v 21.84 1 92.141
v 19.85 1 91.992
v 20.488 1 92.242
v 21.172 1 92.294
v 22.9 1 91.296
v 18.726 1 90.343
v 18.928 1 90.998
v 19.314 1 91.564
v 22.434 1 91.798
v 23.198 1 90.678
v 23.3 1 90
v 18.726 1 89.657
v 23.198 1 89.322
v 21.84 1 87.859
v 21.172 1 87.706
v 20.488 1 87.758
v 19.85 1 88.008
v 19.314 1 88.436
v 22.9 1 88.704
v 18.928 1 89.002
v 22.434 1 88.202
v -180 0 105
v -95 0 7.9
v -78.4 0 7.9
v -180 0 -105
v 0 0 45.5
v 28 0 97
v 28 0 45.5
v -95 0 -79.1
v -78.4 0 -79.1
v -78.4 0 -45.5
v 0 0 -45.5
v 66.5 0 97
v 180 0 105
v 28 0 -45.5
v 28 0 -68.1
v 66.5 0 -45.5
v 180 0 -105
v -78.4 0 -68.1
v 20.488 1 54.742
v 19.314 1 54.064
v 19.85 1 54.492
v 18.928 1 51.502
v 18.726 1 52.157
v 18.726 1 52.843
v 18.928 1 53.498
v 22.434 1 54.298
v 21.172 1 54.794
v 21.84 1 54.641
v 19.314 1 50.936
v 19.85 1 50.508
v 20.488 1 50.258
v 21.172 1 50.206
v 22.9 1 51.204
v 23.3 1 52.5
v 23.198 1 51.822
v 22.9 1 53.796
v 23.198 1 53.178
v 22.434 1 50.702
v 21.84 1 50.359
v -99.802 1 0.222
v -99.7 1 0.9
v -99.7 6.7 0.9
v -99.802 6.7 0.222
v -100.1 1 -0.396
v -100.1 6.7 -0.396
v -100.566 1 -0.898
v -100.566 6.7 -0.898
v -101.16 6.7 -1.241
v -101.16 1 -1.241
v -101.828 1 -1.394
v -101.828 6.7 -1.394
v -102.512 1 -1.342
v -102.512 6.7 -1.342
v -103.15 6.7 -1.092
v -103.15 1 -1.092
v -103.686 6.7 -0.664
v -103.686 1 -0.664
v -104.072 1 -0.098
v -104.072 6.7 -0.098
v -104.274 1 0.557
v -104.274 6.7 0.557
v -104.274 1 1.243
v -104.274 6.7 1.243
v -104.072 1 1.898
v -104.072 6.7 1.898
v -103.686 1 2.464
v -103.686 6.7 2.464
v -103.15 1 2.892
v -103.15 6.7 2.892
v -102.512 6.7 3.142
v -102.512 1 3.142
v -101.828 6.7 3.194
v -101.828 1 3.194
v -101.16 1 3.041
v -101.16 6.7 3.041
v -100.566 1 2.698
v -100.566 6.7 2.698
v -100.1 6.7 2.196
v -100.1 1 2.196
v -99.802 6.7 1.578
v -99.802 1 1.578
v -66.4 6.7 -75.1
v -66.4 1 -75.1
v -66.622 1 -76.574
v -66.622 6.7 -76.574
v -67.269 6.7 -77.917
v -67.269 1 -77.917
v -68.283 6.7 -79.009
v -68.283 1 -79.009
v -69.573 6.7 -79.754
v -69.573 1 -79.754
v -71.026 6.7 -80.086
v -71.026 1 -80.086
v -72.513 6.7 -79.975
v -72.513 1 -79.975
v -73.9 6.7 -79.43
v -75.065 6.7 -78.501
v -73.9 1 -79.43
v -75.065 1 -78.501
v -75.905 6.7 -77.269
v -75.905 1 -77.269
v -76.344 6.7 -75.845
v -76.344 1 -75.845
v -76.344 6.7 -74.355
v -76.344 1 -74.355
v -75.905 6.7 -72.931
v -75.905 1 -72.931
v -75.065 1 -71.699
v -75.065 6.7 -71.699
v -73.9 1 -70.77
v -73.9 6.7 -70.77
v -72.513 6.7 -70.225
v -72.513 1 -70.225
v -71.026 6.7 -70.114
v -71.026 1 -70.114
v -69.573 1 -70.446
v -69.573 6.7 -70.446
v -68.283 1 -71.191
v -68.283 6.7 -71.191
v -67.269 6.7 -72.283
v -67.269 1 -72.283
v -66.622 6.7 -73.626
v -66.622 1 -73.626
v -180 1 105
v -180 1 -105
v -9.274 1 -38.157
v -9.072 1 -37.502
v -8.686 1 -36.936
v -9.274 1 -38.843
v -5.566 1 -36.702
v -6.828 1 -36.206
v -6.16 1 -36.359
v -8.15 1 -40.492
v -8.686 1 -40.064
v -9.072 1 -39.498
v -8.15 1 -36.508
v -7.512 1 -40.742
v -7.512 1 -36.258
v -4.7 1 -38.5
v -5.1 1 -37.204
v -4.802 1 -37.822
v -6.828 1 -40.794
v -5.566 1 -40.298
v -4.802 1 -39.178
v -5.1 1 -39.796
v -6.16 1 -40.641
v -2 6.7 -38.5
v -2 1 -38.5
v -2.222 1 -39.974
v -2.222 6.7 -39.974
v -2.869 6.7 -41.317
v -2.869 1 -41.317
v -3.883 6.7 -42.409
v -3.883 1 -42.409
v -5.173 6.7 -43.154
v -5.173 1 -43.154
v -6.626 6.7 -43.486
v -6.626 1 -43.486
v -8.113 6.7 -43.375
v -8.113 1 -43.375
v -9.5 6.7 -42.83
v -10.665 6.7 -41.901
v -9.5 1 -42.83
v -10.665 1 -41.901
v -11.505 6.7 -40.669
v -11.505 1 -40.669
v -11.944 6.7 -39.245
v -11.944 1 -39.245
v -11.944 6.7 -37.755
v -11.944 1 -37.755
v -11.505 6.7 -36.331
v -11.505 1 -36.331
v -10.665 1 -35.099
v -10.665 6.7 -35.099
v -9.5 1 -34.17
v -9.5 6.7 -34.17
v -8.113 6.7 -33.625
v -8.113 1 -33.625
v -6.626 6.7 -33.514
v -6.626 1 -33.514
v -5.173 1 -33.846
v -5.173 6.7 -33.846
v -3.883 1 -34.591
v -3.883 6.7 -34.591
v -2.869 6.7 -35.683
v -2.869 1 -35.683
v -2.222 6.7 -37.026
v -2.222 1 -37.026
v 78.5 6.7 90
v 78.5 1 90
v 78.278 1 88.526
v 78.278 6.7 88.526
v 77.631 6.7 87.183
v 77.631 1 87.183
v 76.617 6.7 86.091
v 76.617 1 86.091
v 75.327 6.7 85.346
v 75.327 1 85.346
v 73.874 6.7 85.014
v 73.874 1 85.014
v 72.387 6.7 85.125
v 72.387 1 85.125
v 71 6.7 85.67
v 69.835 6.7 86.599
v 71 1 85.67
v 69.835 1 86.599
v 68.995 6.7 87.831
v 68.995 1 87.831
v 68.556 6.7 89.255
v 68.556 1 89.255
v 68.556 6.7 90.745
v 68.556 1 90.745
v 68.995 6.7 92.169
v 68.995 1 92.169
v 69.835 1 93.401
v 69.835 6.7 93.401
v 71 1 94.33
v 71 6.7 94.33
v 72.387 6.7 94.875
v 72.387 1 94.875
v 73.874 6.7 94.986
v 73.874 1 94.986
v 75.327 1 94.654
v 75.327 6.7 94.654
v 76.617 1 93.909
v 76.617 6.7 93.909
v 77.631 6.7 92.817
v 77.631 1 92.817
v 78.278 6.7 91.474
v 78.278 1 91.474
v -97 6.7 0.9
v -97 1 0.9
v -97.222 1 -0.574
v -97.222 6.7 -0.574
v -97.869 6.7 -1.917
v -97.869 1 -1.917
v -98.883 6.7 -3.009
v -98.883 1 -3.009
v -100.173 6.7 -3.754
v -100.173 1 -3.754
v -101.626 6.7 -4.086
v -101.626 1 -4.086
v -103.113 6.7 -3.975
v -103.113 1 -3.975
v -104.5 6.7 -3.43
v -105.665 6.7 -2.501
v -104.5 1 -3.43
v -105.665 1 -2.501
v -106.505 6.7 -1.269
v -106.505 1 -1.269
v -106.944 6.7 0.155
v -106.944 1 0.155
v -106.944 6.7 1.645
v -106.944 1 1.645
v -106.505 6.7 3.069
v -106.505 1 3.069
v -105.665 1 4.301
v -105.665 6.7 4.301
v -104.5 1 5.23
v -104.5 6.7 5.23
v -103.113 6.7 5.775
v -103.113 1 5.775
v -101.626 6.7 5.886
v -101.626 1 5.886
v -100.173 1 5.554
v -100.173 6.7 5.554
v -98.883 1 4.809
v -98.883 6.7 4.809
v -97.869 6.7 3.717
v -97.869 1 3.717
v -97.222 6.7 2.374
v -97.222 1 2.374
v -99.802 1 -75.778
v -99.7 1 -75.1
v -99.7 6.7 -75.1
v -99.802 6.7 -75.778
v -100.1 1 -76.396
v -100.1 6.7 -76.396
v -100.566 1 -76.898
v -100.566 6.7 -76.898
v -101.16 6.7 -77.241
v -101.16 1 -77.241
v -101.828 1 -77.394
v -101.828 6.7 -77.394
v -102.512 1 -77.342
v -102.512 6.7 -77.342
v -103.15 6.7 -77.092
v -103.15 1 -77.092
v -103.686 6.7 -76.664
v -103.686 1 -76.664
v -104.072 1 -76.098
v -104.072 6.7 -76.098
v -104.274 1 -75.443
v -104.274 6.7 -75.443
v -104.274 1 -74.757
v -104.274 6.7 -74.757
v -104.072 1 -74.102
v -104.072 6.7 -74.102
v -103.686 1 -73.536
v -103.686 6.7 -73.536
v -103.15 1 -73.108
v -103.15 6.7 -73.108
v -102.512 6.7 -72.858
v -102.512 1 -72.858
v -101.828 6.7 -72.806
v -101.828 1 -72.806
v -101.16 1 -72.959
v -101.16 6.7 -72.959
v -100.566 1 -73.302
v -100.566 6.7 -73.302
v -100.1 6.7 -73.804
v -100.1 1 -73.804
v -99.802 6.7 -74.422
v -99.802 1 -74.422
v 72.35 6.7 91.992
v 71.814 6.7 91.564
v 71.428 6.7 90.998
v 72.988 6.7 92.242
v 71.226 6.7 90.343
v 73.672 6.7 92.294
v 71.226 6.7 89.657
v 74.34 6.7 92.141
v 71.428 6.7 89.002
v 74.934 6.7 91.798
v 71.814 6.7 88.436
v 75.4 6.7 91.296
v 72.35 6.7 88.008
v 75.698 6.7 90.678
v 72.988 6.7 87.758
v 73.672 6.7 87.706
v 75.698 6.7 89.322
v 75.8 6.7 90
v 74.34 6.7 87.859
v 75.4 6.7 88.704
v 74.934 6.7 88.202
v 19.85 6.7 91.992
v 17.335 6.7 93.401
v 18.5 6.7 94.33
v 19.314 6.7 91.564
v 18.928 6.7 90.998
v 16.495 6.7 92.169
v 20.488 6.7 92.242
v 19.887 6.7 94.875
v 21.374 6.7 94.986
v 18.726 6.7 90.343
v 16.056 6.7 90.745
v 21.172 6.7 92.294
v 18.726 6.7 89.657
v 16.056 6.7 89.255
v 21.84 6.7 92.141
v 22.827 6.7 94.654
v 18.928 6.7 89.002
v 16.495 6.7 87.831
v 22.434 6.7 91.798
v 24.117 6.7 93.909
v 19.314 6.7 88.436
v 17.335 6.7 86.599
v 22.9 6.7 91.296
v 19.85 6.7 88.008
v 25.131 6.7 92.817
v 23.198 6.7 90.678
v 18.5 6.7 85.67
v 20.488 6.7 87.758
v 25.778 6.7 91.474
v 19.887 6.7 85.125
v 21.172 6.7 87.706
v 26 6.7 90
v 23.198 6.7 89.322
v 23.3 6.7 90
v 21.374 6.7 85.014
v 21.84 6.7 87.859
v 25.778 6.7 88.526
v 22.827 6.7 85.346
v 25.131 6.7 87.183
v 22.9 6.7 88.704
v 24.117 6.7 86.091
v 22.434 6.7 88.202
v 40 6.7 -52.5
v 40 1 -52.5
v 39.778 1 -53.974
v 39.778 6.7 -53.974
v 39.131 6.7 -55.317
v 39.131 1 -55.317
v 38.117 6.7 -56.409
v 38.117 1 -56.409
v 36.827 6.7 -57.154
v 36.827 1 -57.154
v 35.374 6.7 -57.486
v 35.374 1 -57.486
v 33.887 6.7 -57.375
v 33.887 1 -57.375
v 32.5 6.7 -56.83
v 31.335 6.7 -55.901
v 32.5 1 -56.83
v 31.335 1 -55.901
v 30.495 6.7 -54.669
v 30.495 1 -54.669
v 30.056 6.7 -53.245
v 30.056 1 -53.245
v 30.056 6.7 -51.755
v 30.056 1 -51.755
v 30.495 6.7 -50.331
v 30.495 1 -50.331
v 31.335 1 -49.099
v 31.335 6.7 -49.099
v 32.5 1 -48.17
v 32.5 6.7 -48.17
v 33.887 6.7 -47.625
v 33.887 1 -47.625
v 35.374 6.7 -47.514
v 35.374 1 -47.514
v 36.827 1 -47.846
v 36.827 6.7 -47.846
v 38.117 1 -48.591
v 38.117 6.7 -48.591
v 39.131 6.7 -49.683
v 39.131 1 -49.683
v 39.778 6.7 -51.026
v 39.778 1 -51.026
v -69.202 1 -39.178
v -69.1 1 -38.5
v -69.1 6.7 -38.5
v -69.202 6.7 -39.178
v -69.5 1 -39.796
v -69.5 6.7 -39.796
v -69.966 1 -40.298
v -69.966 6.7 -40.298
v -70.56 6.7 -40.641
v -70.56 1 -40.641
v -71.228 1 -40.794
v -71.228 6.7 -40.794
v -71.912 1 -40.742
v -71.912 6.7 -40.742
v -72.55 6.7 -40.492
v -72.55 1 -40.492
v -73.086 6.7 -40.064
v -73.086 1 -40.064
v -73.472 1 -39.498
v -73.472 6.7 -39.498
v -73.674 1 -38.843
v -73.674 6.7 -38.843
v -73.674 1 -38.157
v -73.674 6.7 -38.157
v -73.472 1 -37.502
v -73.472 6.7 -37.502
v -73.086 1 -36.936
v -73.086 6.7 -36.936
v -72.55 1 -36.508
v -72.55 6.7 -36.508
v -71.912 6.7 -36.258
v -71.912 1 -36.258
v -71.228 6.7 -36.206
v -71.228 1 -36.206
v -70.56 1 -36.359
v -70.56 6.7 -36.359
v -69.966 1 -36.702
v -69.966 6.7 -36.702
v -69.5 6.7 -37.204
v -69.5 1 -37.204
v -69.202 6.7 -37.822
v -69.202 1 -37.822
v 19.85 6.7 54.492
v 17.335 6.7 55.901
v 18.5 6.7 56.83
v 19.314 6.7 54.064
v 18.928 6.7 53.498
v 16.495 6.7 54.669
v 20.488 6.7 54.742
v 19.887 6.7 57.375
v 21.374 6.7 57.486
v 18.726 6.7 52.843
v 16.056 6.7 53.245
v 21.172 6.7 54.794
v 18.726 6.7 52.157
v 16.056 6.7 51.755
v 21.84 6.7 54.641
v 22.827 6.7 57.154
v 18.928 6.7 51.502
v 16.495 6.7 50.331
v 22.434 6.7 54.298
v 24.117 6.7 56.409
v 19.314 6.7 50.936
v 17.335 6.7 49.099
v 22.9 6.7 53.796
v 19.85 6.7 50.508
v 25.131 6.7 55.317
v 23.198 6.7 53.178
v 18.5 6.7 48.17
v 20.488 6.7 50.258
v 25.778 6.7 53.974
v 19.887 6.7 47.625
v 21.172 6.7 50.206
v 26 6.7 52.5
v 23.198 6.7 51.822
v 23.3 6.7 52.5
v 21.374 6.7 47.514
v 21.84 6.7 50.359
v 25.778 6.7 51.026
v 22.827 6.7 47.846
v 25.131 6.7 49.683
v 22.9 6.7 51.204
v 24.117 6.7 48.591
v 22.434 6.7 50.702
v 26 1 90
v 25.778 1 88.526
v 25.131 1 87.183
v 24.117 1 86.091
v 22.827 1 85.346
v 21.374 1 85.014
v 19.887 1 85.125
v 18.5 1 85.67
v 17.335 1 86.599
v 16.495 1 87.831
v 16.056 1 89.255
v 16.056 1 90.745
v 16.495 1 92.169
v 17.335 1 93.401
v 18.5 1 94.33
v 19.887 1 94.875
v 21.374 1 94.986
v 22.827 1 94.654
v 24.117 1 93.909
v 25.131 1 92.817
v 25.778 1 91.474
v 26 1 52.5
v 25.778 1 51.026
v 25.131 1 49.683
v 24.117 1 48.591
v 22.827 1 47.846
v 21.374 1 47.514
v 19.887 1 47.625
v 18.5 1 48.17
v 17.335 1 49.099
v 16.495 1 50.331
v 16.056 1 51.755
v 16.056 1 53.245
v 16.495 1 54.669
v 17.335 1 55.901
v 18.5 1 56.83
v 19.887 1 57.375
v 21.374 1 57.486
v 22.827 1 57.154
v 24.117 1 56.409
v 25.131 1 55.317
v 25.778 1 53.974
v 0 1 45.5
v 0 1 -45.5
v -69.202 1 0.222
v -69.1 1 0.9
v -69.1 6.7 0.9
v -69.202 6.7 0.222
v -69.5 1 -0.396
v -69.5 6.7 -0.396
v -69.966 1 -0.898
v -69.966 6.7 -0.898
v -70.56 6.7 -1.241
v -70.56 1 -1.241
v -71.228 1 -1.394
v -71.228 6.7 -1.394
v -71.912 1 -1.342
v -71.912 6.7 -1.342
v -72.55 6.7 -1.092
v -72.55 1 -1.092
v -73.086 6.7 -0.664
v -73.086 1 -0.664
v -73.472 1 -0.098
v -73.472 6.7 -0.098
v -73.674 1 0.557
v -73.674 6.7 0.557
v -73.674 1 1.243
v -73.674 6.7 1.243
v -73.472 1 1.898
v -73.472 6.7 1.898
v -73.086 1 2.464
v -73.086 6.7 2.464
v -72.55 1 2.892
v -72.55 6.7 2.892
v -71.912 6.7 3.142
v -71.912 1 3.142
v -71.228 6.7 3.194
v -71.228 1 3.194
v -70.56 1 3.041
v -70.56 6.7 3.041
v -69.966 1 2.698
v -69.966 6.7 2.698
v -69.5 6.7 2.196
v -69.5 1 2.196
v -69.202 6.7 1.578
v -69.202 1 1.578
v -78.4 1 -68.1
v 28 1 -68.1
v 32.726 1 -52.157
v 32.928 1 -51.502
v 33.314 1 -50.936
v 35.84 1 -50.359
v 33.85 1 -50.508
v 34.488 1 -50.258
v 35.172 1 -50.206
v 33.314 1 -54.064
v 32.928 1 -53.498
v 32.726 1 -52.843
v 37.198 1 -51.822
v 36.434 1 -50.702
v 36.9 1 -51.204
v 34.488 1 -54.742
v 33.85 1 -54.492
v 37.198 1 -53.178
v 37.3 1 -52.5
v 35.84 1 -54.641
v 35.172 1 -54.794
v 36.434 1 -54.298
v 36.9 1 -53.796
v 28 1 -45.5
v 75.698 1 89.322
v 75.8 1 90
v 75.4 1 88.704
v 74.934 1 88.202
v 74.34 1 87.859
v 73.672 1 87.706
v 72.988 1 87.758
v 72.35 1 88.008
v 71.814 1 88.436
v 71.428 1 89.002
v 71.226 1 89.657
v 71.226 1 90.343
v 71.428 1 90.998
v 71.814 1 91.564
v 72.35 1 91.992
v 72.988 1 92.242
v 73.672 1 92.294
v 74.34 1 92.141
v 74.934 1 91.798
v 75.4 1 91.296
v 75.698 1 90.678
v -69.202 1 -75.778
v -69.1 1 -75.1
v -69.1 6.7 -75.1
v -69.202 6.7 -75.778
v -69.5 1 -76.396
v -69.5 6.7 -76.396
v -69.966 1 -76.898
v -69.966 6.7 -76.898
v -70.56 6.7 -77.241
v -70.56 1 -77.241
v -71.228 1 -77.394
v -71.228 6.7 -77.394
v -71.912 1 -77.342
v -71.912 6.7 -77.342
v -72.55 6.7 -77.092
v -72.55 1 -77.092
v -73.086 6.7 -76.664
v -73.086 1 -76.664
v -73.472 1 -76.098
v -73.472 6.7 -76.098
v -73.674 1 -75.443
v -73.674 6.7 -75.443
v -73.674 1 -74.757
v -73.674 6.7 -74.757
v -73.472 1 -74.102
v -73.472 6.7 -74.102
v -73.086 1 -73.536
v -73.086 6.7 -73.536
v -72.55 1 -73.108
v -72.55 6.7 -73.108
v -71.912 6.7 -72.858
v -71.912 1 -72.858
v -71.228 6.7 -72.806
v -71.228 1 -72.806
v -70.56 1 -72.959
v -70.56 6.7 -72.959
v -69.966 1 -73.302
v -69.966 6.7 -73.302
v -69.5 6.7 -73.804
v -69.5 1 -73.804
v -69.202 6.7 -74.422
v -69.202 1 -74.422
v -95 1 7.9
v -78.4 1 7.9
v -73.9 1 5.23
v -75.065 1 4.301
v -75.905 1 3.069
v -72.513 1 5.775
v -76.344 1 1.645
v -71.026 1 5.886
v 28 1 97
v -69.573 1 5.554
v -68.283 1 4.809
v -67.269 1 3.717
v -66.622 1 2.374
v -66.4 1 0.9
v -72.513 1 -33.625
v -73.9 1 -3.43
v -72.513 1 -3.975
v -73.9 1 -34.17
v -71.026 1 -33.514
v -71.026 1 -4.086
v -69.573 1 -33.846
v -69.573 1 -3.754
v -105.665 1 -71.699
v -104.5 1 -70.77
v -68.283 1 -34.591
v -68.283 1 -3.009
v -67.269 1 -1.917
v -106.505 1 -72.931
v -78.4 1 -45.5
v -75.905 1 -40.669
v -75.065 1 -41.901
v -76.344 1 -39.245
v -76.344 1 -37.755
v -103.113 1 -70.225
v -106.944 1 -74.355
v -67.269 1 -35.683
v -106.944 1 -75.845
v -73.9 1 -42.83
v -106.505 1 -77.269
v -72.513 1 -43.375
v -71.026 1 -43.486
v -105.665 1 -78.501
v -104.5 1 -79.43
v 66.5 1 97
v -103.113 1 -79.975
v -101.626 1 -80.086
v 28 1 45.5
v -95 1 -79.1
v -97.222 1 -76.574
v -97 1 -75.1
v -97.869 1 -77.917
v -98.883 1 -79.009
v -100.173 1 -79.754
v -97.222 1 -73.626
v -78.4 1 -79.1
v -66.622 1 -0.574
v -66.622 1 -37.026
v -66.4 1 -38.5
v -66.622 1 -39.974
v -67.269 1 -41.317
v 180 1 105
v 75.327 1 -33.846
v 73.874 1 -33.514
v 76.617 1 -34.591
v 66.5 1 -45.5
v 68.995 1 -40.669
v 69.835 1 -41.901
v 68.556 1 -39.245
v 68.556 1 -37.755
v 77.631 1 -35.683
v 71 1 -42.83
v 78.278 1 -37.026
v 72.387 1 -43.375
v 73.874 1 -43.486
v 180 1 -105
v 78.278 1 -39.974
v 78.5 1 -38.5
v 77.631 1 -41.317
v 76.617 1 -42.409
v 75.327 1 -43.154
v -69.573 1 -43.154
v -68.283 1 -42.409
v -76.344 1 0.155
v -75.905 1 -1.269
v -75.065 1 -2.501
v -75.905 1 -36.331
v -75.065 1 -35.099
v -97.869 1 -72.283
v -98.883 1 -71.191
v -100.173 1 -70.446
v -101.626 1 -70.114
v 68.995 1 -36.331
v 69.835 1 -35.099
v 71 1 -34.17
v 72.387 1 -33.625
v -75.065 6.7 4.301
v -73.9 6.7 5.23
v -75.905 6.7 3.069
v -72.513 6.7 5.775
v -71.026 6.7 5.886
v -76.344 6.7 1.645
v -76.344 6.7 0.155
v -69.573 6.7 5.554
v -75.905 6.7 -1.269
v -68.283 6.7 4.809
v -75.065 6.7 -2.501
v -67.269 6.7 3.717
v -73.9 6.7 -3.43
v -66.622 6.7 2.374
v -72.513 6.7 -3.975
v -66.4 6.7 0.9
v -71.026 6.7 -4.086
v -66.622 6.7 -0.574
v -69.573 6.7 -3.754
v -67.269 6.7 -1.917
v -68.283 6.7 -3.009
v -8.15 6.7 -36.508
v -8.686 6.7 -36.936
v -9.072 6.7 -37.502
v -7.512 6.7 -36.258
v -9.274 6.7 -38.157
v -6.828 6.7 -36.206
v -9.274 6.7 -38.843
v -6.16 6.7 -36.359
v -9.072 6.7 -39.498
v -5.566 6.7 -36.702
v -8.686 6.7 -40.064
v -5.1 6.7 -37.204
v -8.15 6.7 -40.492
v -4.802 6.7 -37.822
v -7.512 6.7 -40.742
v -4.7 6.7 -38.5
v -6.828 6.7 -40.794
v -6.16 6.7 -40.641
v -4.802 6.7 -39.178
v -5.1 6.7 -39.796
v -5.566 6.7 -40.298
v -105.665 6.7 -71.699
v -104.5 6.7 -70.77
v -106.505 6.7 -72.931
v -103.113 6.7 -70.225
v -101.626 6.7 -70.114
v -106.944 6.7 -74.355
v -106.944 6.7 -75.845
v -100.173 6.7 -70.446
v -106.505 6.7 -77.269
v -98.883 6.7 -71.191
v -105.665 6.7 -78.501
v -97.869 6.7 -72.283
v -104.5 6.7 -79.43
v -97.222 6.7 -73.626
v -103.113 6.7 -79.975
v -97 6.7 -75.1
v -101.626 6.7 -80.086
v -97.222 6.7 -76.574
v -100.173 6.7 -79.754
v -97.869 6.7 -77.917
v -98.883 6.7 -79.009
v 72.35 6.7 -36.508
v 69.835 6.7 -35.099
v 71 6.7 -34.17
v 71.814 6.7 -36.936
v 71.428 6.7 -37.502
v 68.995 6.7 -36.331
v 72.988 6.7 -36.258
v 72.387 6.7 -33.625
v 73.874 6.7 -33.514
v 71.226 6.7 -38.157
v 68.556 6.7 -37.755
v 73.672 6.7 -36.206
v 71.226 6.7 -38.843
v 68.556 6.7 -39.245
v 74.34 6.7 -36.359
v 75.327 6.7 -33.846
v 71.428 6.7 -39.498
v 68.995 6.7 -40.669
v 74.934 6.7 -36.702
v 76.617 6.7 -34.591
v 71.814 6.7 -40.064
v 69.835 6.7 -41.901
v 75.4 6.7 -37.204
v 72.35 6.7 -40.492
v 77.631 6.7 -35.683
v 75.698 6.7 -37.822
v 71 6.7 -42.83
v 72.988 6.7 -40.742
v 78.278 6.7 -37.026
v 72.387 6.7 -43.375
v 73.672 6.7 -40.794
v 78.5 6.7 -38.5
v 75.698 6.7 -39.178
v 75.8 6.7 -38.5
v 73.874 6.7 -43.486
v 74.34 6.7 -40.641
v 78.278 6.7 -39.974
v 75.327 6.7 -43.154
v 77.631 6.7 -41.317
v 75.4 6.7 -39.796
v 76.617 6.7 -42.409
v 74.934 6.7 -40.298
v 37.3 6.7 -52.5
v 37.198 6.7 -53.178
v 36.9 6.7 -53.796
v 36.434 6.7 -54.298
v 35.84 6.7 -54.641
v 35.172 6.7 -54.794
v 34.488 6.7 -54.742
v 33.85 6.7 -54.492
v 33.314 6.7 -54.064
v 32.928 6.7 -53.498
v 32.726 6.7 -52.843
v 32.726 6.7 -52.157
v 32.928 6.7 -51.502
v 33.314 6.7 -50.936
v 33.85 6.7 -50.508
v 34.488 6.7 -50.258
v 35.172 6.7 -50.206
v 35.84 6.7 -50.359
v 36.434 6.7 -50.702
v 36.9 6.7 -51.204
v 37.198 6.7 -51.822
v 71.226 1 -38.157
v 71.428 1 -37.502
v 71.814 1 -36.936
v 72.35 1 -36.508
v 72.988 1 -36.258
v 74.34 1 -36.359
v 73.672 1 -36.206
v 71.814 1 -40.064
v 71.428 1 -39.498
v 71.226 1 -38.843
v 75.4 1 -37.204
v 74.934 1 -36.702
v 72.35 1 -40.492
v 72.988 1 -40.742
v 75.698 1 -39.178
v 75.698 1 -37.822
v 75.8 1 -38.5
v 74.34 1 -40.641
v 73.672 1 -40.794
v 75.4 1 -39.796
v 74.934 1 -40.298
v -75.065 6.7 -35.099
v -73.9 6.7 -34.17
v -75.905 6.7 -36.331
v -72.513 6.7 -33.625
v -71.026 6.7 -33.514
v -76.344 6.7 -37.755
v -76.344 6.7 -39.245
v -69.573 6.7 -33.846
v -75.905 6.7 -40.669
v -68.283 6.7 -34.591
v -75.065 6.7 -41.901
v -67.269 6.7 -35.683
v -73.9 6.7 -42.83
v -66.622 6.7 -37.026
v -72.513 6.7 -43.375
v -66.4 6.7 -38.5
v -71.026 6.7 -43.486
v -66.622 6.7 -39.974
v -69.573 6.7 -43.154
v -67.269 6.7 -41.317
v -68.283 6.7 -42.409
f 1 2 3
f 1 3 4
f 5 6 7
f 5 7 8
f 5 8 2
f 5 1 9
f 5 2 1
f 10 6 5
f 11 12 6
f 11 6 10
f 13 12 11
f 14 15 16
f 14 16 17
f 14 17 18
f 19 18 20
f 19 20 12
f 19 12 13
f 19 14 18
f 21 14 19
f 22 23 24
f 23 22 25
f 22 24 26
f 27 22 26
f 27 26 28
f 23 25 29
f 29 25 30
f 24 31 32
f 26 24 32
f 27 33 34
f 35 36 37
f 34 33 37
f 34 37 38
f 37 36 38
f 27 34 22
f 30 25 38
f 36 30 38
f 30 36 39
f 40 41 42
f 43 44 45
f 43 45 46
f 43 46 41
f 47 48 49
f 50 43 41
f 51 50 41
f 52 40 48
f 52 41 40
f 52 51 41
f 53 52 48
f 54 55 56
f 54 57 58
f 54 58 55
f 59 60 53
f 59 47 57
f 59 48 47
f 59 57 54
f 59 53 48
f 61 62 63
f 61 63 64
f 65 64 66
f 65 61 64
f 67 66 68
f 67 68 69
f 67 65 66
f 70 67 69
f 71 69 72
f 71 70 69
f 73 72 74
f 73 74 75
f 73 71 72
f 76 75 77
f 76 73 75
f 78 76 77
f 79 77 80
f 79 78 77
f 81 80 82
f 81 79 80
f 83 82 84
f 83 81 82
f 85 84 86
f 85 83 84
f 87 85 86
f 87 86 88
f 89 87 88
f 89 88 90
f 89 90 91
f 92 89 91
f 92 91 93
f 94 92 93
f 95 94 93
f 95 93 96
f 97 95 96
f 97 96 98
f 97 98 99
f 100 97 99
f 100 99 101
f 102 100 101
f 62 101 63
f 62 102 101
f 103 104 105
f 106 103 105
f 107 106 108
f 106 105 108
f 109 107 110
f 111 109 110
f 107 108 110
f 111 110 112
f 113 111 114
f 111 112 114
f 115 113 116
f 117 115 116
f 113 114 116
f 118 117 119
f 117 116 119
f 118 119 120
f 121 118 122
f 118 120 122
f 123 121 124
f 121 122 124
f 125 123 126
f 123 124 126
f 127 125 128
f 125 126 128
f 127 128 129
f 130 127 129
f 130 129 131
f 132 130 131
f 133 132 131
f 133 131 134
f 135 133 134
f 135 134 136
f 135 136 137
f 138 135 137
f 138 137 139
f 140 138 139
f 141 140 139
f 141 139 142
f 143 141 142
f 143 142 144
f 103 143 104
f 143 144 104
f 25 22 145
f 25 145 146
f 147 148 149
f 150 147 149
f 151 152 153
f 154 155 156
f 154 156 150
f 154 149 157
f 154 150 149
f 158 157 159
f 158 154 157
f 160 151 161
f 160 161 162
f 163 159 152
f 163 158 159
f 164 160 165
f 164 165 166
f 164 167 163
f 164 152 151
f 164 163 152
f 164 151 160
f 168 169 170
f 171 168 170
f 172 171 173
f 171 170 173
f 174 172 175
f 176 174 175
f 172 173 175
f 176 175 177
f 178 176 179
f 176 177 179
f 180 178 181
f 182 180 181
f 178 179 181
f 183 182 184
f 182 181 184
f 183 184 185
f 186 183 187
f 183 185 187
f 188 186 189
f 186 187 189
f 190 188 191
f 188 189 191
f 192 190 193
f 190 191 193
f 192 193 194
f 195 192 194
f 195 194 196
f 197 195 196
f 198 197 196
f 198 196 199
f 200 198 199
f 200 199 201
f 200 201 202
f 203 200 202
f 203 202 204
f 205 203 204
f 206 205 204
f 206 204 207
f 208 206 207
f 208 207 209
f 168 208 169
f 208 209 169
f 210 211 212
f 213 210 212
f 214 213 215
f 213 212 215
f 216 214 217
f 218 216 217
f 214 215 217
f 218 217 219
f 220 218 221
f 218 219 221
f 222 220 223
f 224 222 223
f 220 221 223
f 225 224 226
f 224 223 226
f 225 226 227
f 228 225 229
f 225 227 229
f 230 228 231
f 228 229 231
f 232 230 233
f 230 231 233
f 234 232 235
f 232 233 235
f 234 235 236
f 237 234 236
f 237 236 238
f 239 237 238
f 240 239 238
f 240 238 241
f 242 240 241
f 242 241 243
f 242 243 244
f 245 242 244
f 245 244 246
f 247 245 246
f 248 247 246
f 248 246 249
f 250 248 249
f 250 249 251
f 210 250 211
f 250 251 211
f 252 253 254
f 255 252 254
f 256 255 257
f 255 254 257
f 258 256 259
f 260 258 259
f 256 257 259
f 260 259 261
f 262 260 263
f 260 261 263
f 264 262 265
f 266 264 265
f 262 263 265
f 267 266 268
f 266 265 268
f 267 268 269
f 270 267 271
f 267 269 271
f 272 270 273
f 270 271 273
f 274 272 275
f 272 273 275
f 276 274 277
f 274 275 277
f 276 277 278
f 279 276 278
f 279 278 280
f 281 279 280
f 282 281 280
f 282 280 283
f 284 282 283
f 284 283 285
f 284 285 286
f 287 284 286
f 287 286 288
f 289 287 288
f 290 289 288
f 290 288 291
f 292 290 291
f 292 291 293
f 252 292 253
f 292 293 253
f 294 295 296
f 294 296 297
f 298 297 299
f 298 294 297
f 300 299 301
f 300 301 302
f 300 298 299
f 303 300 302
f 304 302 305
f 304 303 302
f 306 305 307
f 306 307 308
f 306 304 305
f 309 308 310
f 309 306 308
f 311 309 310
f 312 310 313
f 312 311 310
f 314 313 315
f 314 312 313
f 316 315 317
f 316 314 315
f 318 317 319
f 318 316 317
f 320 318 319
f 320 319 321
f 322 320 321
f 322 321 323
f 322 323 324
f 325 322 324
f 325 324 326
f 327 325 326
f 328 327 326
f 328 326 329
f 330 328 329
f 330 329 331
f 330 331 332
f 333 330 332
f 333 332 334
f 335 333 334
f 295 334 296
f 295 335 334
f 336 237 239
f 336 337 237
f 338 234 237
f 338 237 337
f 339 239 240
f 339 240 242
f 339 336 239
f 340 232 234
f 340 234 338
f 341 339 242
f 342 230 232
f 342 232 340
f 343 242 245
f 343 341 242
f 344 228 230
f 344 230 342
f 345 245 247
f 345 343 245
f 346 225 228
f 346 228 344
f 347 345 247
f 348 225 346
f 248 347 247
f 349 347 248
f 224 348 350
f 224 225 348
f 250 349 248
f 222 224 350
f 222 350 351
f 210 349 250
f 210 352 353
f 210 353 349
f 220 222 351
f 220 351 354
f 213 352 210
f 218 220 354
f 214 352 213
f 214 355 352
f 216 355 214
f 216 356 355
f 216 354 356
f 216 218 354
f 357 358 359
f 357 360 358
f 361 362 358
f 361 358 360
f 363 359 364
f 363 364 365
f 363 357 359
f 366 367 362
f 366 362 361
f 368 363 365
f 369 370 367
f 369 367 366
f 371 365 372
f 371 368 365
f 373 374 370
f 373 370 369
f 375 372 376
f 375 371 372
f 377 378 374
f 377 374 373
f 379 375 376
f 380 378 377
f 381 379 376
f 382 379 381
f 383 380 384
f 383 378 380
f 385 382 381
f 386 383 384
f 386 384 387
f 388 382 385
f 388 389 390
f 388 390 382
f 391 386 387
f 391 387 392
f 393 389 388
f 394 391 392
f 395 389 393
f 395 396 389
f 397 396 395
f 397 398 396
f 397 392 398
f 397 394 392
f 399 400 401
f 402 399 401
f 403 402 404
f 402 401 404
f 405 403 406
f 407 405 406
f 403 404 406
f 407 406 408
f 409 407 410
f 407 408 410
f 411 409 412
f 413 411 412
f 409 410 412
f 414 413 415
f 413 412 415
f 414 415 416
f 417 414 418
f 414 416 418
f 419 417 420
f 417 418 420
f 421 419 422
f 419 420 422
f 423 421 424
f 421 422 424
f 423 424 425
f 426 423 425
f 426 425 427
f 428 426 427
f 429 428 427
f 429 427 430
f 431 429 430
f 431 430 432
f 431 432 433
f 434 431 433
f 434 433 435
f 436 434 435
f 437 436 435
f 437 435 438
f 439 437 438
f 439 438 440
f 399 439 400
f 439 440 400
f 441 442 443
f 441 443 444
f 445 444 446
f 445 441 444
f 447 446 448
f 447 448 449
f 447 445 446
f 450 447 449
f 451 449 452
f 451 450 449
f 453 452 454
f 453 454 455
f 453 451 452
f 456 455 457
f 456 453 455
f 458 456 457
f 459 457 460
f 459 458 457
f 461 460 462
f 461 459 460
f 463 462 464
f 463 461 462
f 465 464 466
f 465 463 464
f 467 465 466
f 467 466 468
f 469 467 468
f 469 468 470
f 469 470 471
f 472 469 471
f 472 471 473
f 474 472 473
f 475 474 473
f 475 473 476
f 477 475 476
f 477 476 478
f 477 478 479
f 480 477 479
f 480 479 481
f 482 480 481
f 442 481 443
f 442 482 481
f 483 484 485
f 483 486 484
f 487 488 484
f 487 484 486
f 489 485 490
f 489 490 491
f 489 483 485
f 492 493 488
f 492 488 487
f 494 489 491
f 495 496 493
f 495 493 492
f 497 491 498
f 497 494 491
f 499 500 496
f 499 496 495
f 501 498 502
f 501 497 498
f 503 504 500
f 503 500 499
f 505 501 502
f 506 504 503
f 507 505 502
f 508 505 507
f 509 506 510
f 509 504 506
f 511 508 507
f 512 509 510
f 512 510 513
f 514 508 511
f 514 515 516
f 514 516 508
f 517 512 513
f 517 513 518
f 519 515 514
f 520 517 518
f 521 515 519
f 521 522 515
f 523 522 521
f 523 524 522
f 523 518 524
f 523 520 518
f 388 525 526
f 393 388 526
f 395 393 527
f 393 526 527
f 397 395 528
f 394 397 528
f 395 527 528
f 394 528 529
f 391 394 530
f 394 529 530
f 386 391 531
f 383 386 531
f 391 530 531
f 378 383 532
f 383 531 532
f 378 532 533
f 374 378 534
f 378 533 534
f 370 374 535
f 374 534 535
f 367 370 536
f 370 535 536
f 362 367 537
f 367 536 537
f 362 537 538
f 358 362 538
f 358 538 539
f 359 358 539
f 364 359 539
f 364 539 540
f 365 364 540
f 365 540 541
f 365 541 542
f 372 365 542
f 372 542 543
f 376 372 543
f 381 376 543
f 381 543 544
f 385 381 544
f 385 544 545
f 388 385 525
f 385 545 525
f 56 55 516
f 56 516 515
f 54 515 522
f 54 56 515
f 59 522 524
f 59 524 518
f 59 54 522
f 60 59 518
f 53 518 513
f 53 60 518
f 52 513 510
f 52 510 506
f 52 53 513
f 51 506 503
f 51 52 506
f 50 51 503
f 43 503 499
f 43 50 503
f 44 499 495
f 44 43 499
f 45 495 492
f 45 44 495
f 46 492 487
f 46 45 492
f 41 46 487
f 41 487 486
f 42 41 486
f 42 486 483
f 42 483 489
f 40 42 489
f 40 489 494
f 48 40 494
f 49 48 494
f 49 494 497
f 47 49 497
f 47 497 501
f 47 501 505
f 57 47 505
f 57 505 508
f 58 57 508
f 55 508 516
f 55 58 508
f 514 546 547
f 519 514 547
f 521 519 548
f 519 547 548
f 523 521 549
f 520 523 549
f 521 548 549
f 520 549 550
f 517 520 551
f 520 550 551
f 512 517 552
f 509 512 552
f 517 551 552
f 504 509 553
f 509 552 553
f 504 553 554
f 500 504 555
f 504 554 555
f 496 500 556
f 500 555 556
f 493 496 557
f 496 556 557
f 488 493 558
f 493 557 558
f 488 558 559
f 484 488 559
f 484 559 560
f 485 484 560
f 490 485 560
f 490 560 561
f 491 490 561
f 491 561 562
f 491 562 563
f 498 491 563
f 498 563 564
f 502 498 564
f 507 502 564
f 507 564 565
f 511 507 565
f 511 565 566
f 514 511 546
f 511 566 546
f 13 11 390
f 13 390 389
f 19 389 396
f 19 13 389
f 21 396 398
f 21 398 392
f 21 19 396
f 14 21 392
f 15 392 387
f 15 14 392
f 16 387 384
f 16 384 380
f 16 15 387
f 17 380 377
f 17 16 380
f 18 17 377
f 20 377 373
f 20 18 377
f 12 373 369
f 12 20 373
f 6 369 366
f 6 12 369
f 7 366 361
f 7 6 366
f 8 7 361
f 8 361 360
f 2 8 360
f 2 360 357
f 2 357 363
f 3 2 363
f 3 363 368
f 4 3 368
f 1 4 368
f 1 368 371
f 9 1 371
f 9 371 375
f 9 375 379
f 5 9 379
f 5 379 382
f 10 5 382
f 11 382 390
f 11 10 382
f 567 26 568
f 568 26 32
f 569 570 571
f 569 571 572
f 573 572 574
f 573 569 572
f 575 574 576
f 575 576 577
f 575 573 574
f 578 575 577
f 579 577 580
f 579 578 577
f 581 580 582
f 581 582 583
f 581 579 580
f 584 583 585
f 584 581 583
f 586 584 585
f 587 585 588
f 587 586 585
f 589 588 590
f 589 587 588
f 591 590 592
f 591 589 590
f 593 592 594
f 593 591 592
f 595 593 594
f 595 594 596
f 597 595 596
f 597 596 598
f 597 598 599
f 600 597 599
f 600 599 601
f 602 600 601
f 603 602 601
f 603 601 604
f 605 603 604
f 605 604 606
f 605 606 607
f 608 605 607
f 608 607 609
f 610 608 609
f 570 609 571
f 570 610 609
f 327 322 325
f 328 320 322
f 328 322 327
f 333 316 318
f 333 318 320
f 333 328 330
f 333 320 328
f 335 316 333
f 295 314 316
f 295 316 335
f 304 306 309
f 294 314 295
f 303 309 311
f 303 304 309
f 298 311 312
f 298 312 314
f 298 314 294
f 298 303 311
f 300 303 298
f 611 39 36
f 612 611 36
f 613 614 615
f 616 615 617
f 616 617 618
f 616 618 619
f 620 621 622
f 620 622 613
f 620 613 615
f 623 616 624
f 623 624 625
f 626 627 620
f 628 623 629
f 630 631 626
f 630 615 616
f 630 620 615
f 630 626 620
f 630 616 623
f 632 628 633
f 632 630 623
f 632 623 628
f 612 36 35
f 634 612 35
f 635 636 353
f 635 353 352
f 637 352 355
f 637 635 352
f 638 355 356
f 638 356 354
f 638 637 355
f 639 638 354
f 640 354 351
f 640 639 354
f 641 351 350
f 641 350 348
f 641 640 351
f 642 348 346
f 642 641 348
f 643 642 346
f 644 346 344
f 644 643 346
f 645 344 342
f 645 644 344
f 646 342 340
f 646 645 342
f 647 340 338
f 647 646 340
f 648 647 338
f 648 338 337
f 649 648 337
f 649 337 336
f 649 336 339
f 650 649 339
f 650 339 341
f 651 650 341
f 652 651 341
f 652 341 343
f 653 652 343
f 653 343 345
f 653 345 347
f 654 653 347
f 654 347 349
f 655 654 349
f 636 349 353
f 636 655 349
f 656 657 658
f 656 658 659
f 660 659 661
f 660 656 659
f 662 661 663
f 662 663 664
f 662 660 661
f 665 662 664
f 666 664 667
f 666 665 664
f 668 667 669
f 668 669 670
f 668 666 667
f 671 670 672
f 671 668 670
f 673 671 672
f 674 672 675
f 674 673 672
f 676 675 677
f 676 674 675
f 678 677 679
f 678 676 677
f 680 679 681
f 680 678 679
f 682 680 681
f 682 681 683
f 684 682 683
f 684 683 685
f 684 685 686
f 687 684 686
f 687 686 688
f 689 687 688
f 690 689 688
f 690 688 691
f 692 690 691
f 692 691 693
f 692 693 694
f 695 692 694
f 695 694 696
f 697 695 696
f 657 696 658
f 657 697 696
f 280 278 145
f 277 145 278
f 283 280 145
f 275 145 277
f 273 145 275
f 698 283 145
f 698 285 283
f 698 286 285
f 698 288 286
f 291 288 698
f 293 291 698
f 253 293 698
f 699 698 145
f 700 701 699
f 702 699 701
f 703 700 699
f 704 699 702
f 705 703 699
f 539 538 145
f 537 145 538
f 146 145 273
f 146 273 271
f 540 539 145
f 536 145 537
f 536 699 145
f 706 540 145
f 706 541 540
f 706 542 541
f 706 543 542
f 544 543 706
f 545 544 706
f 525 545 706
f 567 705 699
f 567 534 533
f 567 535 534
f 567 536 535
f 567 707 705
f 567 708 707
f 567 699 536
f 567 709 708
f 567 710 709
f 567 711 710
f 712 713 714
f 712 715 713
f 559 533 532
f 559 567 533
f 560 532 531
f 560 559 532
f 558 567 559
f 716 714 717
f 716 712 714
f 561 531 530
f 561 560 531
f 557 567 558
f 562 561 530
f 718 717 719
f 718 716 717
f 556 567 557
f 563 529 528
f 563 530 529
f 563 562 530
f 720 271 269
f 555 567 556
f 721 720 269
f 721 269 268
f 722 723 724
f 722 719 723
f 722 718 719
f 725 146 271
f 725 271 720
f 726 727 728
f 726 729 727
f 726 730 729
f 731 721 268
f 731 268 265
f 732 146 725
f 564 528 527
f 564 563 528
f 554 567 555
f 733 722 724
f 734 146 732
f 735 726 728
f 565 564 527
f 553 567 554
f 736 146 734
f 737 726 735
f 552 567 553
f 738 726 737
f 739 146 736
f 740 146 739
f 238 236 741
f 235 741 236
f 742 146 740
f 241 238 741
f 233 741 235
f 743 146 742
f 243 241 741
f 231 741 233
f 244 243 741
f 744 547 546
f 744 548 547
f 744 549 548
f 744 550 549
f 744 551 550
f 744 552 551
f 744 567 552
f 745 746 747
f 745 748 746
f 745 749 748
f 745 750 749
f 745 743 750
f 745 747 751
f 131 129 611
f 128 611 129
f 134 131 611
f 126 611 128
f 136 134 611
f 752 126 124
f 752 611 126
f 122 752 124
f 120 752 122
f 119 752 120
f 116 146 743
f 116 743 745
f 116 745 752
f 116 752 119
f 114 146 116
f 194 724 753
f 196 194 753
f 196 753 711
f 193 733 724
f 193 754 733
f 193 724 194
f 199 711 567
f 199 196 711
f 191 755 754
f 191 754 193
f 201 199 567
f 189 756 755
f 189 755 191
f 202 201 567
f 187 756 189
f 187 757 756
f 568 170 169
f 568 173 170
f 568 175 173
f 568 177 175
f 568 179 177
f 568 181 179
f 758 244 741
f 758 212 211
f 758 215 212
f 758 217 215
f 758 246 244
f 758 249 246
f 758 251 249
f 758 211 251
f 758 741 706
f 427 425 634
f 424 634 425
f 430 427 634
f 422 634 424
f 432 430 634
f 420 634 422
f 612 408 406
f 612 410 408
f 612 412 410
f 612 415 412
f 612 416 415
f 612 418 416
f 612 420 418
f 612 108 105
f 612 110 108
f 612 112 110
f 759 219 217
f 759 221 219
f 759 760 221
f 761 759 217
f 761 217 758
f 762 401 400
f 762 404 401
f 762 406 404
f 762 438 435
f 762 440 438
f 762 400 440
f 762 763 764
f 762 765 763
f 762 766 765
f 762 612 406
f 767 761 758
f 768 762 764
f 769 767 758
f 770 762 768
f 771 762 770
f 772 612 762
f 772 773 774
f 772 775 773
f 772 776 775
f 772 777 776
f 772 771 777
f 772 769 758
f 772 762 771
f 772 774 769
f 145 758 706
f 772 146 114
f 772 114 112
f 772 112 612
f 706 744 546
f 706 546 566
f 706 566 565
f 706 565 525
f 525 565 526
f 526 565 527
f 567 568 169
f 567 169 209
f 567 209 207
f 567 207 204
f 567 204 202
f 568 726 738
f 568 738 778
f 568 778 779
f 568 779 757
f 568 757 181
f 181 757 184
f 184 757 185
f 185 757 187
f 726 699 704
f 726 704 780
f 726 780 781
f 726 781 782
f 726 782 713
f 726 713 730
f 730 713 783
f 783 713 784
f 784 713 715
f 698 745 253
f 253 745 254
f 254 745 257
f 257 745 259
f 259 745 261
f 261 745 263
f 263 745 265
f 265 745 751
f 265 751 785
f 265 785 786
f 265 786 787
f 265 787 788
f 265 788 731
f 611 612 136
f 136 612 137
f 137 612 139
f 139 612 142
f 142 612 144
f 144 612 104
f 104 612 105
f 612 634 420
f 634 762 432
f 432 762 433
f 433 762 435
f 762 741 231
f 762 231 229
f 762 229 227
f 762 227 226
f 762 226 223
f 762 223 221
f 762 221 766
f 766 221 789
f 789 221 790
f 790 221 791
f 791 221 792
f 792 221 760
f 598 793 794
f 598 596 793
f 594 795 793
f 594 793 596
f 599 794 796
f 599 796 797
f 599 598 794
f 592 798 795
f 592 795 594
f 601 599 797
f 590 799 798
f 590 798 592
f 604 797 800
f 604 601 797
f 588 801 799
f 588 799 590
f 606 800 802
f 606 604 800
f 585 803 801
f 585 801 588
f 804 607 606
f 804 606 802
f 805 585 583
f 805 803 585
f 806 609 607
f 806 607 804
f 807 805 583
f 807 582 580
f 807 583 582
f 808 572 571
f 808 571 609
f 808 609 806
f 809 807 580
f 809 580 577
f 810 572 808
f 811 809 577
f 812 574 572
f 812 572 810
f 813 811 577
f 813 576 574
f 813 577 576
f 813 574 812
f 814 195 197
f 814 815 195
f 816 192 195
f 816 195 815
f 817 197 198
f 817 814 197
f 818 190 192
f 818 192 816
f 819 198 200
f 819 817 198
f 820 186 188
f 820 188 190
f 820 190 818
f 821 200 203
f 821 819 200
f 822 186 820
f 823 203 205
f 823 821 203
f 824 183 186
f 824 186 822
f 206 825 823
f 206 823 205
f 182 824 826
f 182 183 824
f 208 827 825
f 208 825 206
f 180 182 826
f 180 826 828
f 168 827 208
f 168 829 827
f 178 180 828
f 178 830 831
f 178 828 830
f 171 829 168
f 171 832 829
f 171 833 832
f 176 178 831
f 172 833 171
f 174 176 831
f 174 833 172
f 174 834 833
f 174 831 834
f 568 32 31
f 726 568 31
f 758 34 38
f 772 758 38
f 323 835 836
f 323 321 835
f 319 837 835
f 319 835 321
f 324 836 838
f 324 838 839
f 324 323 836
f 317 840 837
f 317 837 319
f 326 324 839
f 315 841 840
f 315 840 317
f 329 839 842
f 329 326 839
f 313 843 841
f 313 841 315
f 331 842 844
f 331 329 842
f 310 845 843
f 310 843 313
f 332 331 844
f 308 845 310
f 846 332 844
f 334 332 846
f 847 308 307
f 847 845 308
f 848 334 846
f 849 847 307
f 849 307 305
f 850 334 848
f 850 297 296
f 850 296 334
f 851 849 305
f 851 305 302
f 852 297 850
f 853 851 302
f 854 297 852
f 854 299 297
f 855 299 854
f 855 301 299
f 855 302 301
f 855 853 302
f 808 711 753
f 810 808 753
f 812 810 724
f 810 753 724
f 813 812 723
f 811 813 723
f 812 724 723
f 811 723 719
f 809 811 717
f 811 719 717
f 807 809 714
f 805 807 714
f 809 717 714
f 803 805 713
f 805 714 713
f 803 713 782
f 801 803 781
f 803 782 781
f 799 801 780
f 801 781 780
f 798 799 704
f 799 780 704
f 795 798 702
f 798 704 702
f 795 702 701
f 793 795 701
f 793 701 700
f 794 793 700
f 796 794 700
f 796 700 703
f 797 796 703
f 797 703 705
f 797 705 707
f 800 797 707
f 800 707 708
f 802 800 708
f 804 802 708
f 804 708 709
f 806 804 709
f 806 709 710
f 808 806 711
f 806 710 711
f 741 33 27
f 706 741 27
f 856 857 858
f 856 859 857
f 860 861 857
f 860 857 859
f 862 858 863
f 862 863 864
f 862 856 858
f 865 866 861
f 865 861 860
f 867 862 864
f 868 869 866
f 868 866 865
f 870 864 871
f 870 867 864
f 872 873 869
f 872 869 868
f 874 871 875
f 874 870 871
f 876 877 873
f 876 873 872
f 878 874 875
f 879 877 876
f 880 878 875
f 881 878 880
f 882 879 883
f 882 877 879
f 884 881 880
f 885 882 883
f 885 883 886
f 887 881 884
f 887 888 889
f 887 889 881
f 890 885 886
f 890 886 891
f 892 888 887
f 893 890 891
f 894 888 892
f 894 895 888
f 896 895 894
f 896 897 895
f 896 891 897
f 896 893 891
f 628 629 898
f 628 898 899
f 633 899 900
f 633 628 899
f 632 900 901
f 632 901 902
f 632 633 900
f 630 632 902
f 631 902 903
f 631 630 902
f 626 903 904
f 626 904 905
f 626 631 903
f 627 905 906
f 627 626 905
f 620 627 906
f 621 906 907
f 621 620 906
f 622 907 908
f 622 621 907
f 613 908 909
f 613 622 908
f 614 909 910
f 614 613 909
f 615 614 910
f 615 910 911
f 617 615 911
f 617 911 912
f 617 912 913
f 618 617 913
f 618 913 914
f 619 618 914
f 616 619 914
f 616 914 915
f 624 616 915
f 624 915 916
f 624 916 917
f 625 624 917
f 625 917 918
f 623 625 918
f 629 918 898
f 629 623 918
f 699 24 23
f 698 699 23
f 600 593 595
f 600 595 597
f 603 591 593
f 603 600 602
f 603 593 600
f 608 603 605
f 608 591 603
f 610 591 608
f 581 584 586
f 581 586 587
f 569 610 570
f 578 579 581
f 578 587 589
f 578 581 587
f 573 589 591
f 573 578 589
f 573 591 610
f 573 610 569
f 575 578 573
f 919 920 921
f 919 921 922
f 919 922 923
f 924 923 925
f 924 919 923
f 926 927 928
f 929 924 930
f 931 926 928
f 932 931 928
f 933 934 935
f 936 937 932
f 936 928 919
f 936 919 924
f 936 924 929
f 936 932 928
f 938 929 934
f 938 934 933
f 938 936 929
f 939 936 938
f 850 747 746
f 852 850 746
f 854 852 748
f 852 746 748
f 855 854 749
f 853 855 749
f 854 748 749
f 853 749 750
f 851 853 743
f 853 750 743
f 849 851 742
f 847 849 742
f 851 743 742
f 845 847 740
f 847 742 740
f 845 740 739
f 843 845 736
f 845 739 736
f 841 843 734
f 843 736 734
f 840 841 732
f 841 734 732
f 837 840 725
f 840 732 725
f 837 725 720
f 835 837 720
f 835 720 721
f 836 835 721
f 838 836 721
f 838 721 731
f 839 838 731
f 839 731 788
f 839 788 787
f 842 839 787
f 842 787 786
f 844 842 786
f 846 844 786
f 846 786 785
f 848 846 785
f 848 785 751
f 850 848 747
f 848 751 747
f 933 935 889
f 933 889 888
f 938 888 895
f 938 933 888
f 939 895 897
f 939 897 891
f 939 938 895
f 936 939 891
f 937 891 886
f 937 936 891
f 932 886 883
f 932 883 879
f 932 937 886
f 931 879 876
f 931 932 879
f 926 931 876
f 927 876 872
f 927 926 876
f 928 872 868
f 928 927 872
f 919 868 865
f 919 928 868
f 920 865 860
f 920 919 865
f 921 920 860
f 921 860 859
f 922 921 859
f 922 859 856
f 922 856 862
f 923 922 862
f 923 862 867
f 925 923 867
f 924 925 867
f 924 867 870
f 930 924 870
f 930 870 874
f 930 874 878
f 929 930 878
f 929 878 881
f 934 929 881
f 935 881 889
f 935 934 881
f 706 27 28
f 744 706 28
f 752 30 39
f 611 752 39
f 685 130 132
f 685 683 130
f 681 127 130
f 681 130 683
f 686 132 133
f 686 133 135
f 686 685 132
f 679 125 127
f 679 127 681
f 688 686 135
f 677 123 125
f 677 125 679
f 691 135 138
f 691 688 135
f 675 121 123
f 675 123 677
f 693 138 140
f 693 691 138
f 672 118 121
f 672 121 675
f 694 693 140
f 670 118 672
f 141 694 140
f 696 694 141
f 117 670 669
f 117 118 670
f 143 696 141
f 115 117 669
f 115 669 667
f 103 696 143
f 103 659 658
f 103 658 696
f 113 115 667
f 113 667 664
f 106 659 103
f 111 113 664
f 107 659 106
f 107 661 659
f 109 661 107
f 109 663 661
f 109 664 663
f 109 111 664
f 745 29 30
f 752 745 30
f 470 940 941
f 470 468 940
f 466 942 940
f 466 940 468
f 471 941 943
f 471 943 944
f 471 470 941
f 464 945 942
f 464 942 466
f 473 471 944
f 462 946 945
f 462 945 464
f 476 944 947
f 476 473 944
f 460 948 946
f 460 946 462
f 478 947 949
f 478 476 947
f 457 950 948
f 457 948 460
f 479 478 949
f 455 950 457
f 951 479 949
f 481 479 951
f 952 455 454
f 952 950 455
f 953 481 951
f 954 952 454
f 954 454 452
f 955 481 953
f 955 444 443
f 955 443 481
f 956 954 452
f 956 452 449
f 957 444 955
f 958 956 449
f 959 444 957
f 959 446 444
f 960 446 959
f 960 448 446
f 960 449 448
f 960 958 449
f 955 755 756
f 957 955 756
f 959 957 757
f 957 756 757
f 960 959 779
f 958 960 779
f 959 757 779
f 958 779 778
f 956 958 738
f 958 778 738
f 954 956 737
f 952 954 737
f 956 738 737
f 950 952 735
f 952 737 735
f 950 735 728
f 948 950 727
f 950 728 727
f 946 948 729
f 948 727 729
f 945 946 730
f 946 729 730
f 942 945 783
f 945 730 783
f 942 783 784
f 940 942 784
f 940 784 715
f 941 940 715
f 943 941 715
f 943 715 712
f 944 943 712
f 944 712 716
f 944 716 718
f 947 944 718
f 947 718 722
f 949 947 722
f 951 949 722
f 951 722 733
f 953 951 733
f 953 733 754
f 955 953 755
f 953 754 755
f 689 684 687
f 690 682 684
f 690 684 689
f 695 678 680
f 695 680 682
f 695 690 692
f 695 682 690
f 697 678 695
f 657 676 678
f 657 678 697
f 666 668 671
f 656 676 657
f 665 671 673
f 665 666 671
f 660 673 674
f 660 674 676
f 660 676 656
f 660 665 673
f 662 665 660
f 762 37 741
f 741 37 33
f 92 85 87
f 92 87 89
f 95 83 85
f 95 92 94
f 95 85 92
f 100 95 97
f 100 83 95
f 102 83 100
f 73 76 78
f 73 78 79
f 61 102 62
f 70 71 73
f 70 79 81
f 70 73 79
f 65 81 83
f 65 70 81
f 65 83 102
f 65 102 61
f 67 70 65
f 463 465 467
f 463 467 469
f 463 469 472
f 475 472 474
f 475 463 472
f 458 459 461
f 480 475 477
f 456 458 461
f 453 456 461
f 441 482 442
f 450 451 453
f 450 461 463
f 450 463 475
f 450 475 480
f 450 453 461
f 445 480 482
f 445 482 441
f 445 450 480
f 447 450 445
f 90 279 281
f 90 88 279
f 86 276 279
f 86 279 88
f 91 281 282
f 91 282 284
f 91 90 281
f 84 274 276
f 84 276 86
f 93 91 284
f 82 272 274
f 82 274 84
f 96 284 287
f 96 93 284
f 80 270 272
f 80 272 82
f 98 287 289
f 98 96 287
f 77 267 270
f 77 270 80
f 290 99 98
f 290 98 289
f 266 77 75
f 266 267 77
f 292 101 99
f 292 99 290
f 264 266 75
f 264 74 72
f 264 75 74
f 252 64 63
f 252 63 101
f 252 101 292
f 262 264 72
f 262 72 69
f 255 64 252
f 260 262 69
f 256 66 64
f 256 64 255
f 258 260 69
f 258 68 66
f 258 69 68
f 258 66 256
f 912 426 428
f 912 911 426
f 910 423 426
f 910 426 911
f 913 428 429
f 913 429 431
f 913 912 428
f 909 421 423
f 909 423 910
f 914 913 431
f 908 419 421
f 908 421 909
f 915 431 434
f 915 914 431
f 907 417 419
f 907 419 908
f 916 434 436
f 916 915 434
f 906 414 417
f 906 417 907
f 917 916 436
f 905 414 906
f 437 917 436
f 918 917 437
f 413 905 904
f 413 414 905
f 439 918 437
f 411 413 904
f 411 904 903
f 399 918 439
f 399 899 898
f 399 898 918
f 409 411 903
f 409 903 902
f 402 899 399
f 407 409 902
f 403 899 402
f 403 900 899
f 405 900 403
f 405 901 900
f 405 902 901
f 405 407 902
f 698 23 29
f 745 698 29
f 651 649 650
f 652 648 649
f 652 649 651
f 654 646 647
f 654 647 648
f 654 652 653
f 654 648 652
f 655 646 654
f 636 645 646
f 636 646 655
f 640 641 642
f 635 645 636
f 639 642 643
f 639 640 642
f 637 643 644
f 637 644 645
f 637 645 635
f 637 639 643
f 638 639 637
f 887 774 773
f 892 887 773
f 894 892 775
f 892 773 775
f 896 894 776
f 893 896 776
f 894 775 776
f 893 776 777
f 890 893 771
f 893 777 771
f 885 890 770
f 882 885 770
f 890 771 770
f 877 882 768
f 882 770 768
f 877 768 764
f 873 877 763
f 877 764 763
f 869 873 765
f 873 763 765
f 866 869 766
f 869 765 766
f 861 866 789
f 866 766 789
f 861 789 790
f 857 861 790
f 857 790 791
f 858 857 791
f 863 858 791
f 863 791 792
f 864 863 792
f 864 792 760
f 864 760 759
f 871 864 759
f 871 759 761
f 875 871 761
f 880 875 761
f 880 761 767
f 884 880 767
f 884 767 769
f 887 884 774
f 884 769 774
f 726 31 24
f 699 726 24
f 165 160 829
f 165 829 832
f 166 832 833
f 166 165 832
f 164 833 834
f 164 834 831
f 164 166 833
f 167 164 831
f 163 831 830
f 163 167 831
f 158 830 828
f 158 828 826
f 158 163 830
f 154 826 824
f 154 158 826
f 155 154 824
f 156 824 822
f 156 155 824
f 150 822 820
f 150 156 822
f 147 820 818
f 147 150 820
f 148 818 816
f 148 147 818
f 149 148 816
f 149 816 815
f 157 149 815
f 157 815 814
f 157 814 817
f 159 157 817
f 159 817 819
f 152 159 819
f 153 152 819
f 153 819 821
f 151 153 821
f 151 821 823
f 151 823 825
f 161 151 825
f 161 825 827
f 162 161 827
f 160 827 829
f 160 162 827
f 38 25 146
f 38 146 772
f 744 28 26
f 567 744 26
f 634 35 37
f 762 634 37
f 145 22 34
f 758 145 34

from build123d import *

# Parameters (mm, degrees)
SKETCH1_W           = 360
SKETCH1_H           = 210
BOSS_EXTRUDE1_DEPTH = 1
SKETCH2_R           = 5
SKETCH2_R_2         = 2.3
BOSS_EXTRUDE2_DEPTH = 5.7


with BuildPart() as part:
    # Sketch1 → Boss-Extrude1 (new body)
    with BuildSketch(Plane(origin=(0, 0, 0), x_dir=(1, 0, 0), z_dir=(0, 1, 0))):
        Rectangle(SKETCH1_W, SKETCH1_H)
        Polygon((28, -45.5), (0, -45.5), (0, 45.5), (-78.4, 45.5), (-78.4, -7.9), (-95, -7.9), (-95, 79.1), (-78.4, 79.1), (-78.4, 68.1), (28, 68.1), (28, 45.5), (66.5, 45.5), (66.5, -45.5), (66.5, -97), (28, -97), align=None, mode=Mode.SUBTRACT)
    extrude(amount=BOSS_EXTRUDE1_DEPTH)

    # Sketch2 → Boss-Extrude2 (add)
    with BuildSketch(Plane(origin=(0, 1, 0), x_dir=(1, 0, 0), z_dir=(0, 1, 0))):
        with Locations((-71.4, 75.1)):
            Circle(SKETCH2_R)
        with Locations((-71.4, 75.1)):
            Circle(SKETCH2_R_2, mode=Mode.SUBTRACT)
        with Locations((-71.4, 38.5)):
            Circle(SKETCH2_R)
        with Locations((-71.4, 38.5)):
            Circle(SKETCH2_R_2, mode=Mode.SUBTRACT)
        with Locations((-102, 75.1)):
            Circle(SKETCH2_R)
        with Locations((-102, 75.1)):
            Circle(SKETCH2_R_2, mode=Mode.SUBTRACT)
        with Locations((-7, 38.5)):
            Circle(SKETCH2_R)
        with Locations((-7, 38.5)):
            Circle(SKETCH2_R_2, mode=Mode.SUBTRACT)
        with Locations((35, 52.5)):
            Circle(SKETCH2_R)
        with Locations((35, 52.5)):
            Circle(SKETCH2_R_2, mode=Mode.SUBTRACT)
        with Locations((21, -52.5)):
            Circle(SKETCH2_R)
        with Locations((21, -52.5)):
            Circle(SKETCH2_R_2, mode=Mode.SUBTRACT)
        with Locations((-71.4, -0.9)):
            Circle(SKETCH2_R)
        with Locations((-71.4, -0.9)):
            Circle(SKETCH2_R_2, mode=Mode.SUBTRACT)
        with Locations((-102, -0.9)):
            Circle(SKETCH2_R)
        with Locations((-102, -0.9)):
            Circle(SKETCH2_R_2, mode=Mode.SUBTRACT)
        with Locations((73.5, 38.5)):
            Circle(SKETCH2_R)
        with Locations((73.5, 38.5)):
            Circle(SKETCH2_R_2, mode=Mode.SUBTRACT)
        with Locations((73.5, -90)):
            Circle(SKETCH2_R)
        with Locations((73.5, -90)):
            Circle(SKETCH2_R_2, mode=Mode.SUBTRACT)
        with Locations((21, -90)):
            Circle(SKETCH2_R)
        with Locations((21, -90)):
            Circle(SKETCH2_R_2, mode=Mode.SUBTRACT)
    extrude(amount=BOSS_EXTRUDE2_DEPTH)


solid = part.part
